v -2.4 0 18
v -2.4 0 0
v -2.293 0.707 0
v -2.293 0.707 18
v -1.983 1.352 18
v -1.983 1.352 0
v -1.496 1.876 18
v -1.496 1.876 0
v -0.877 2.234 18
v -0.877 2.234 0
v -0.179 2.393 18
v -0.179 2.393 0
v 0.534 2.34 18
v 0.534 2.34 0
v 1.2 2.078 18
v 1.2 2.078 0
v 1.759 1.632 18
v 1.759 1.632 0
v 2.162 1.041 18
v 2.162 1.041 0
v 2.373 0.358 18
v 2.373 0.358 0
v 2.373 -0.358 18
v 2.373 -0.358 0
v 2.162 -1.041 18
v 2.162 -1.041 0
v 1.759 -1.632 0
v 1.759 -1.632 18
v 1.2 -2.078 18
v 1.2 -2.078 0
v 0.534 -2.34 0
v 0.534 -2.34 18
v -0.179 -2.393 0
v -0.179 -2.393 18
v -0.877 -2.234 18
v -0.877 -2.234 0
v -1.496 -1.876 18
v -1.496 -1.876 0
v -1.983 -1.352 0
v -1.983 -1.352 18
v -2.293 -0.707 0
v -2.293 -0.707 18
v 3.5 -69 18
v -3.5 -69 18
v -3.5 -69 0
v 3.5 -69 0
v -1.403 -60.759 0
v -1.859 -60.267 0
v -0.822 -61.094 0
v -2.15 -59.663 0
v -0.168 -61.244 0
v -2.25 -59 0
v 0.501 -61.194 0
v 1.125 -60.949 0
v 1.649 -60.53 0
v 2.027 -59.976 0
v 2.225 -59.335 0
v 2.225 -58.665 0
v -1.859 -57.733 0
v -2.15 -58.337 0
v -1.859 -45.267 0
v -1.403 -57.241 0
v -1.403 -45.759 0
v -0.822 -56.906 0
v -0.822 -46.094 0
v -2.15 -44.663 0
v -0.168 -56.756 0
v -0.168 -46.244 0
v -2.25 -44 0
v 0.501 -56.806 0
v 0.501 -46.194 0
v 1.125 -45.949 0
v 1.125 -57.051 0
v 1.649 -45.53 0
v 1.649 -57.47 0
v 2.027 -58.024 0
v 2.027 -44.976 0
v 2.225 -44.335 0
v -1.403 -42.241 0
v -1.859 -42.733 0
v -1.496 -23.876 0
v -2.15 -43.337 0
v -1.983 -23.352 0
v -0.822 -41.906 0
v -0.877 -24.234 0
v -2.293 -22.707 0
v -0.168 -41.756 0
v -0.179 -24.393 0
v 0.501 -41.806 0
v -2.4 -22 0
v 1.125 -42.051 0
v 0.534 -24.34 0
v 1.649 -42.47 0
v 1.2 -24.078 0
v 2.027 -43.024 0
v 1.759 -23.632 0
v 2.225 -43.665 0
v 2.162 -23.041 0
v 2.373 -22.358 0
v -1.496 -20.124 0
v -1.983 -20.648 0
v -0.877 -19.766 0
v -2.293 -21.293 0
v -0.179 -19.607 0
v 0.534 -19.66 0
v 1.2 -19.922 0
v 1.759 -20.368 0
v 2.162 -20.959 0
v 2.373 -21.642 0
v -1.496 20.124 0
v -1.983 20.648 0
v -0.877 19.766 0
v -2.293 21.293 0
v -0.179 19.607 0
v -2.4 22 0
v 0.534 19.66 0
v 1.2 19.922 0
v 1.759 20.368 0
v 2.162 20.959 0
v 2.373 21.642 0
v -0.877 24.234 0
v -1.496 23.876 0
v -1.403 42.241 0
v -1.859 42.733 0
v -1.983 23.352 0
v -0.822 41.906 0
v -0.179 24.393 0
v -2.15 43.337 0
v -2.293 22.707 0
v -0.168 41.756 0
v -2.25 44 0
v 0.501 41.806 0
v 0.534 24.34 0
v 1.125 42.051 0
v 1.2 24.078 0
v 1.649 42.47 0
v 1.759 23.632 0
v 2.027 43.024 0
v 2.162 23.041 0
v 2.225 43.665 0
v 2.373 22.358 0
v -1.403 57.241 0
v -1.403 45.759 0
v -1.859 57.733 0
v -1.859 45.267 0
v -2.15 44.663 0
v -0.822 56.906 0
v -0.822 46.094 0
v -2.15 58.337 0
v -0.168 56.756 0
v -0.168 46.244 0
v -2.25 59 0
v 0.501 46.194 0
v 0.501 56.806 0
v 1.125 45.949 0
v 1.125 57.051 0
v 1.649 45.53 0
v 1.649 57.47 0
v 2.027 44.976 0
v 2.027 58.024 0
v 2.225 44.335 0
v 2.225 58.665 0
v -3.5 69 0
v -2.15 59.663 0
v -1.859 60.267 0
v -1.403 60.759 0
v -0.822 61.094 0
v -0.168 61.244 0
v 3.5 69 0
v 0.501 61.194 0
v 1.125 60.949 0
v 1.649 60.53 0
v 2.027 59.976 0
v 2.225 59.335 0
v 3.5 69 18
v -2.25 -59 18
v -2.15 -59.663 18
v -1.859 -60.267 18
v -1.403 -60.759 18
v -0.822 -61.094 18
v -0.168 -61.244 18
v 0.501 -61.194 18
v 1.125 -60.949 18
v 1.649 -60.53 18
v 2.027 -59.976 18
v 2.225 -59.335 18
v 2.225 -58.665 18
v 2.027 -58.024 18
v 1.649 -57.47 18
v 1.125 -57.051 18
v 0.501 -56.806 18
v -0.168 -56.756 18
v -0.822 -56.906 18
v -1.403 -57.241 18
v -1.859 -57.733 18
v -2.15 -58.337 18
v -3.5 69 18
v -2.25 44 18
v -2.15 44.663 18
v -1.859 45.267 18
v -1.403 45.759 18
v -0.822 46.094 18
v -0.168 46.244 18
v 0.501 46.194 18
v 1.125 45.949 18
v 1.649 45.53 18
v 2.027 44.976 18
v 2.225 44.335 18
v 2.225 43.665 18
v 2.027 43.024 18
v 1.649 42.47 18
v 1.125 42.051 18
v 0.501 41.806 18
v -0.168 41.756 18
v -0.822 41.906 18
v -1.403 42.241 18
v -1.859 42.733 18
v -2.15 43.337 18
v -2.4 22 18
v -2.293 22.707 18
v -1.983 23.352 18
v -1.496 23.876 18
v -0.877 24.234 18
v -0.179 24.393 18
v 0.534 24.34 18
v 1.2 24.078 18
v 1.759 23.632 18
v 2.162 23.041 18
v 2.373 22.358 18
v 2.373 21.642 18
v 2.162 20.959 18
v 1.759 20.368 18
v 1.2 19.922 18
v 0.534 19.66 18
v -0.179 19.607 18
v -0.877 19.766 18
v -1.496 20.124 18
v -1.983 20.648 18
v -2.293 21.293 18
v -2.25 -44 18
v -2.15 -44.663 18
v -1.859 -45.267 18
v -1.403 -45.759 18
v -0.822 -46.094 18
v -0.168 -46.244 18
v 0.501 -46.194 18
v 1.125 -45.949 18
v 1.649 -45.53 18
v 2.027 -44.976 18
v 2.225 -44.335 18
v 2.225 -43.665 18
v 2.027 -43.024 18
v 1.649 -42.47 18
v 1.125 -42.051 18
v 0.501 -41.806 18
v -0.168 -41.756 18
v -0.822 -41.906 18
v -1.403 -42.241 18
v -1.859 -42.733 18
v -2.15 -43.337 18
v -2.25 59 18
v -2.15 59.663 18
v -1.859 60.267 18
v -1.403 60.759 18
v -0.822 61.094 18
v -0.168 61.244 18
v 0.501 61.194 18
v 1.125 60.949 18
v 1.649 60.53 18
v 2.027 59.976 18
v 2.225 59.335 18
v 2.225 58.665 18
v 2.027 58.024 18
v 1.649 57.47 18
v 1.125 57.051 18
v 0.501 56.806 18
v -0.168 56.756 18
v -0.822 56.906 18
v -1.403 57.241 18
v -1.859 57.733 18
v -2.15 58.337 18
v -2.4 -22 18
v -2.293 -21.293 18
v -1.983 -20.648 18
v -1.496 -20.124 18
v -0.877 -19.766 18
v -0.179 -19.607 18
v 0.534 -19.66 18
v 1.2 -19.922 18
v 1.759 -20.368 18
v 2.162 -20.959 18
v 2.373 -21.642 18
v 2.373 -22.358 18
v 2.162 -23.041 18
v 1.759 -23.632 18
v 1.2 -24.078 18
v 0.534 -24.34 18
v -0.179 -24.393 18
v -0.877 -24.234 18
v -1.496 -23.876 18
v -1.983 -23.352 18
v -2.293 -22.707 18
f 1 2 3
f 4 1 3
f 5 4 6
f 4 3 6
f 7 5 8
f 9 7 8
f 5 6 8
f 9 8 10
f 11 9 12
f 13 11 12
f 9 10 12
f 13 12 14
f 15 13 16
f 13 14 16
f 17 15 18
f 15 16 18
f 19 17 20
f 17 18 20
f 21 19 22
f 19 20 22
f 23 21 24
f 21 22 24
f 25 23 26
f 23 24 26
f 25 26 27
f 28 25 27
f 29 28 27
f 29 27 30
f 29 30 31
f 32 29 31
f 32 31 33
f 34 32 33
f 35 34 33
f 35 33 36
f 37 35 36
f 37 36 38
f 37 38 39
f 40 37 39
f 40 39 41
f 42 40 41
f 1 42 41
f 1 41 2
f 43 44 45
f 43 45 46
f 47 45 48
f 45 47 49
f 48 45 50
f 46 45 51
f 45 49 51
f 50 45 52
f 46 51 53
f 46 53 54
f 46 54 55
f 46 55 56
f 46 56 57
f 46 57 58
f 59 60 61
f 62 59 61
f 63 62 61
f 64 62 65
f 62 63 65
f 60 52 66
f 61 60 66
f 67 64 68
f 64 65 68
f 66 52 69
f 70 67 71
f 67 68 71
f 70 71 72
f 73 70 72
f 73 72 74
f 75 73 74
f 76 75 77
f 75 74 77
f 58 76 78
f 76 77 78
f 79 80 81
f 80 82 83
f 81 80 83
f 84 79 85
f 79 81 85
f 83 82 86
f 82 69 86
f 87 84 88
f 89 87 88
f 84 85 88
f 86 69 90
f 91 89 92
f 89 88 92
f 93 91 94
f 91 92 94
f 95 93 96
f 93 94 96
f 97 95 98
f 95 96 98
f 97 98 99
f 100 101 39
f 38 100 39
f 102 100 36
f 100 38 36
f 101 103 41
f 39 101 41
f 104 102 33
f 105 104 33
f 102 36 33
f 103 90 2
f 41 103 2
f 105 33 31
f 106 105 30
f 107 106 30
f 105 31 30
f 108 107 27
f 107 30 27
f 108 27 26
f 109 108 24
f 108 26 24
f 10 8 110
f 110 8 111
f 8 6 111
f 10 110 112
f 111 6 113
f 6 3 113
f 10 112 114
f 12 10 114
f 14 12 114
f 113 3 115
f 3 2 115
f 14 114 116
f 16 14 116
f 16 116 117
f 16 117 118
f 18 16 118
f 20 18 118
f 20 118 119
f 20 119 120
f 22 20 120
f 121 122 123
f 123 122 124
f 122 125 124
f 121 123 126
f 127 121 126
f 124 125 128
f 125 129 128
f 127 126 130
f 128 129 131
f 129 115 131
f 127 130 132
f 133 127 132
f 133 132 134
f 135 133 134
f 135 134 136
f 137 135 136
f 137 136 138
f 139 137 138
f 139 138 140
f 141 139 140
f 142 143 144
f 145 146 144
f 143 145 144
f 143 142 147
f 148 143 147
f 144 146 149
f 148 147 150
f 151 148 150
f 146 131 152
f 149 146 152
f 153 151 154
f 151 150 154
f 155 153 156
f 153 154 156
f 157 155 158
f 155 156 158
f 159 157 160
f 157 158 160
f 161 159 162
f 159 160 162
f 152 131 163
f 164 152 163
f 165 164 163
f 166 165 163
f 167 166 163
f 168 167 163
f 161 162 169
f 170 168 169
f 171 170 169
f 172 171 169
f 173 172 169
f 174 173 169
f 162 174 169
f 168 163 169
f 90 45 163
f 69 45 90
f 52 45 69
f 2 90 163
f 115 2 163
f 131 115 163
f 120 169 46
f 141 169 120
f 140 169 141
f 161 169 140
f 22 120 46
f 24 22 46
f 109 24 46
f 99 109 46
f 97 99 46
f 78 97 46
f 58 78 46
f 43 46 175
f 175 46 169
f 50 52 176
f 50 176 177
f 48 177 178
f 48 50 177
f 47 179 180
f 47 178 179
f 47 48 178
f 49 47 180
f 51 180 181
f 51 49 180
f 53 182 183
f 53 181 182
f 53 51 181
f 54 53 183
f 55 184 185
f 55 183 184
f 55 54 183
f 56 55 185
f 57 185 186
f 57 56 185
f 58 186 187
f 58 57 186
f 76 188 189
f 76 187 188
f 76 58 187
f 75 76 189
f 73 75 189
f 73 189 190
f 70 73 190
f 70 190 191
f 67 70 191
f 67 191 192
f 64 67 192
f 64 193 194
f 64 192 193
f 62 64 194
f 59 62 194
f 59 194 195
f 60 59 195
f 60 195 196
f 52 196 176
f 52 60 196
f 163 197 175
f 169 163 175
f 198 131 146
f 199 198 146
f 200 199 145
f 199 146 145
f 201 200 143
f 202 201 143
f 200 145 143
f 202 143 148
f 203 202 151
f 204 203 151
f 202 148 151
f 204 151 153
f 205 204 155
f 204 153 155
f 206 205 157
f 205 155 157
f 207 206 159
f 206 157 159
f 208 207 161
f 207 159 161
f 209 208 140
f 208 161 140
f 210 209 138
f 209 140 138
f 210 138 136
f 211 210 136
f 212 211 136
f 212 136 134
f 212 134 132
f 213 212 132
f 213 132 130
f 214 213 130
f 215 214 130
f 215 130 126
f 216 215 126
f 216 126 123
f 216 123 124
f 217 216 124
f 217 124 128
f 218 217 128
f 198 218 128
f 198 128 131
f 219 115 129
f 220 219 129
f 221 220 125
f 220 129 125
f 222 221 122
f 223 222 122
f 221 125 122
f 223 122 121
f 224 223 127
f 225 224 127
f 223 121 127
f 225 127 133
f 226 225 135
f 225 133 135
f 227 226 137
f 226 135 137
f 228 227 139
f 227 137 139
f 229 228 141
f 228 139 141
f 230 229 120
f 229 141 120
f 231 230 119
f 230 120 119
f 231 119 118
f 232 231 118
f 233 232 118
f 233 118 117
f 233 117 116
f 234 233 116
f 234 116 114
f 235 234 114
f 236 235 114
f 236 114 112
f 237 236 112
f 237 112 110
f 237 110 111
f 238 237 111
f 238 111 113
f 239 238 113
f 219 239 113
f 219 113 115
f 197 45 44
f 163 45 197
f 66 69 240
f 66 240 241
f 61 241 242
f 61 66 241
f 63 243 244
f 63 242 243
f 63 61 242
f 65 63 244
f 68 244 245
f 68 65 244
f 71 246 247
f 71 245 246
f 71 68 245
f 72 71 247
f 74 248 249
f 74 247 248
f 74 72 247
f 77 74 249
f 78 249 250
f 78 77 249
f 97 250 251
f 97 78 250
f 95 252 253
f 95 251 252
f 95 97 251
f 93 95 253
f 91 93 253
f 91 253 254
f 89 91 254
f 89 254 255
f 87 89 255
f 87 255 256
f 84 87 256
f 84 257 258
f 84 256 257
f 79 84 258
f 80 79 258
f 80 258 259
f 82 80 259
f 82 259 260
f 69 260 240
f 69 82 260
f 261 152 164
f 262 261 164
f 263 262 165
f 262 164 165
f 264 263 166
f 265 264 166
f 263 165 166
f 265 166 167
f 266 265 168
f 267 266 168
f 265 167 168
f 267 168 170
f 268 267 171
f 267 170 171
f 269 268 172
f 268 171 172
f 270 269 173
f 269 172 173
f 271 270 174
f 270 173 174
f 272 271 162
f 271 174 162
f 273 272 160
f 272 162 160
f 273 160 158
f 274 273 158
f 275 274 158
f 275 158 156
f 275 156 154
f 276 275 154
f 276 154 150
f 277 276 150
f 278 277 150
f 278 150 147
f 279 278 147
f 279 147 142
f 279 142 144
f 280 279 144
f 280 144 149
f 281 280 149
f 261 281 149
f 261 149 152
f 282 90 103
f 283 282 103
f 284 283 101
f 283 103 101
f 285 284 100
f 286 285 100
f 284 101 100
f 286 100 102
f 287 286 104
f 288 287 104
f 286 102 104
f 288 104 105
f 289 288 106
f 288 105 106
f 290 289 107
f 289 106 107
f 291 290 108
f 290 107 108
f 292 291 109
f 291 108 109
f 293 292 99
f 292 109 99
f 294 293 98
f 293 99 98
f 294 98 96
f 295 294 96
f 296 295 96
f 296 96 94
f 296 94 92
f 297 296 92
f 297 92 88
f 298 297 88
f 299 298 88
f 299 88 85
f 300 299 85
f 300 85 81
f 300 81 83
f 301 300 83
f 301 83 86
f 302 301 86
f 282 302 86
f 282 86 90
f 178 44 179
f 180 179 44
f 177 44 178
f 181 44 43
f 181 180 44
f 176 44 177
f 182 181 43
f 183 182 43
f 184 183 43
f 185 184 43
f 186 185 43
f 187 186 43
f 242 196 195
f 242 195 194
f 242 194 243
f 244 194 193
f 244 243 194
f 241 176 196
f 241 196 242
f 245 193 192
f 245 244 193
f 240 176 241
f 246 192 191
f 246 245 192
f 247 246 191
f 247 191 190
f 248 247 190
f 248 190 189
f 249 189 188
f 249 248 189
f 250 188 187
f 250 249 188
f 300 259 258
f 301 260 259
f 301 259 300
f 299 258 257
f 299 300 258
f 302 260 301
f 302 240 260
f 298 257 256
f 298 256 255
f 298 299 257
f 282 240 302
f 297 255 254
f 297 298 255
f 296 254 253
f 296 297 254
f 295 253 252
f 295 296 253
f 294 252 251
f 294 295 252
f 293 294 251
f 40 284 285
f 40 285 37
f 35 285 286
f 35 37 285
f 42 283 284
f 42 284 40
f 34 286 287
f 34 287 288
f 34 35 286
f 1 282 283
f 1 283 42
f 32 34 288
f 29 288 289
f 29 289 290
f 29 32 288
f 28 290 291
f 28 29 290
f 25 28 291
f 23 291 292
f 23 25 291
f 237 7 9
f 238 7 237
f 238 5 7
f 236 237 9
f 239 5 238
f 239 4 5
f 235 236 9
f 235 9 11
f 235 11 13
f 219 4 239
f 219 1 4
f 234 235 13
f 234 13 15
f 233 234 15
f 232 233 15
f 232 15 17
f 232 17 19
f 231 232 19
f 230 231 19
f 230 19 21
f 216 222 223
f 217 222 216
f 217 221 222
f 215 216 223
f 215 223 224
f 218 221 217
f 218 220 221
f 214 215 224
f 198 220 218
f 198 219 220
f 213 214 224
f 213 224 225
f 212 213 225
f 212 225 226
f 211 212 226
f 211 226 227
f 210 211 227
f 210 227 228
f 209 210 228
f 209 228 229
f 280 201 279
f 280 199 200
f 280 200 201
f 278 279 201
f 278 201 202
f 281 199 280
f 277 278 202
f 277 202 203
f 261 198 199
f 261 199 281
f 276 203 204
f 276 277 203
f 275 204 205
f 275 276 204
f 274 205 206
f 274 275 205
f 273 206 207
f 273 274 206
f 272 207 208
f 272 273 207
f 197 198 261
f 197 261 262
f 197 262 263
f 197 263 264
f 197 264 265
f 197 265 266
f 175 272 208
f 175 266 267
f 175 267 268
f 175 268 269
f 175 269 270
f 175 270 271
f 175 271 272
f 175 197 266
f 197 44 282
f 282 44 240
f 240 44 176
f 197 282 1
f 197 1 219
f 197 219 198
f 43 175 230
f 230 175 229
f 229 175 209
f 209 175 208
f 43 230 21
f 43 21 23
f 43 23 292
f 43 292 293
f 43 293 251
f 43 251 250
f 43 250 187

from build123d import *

# Parameters (mm, degrees)
SKETCH_1_W         = 7
SKETCH_1_H         = 138
EXTRUDE_1_DEPTH    = 18
HOLE_WIZARD_M4_1_D = 4.8
HOLE_WIZARD_M4_2_D = 4.5


with BuildPart() as part:
    # ｽｹｯﾁ1 → ﾎﾞｽ - 押し出し1 (new body)
    with BuildSketch(Plane.XY):
        Rectangle(SKETCH_1_W, SKETCH_1_H)
    extrude(amount=EXTRUDE_1_DEPTH)

    # M4 すきま穴1 (through all)
    with Locations(Plane.XY.offset(18)):
        with Locations((0, 0), (0, 22), (0, -22)):
            Hole(HOLE_WIZARD_M4_1_D / 2)

    # M4 すきま穴2 (through all)
    with Locations(Plane(origin=(0, 44, 18), x_dir=(1, 0, 0), z_dir=(0, 0, 1))):
        with Locations((0, 0), (0, 15)):
            hole_wizard_m4_2 = Hole(HOLE_WIZARD_M4_2_D / 2)

    # ﾐﾗｰ1: M4 すきま穴2 across plane
    add(hole_wizard_m4_2.mirror(Plane.ZX), mode=Mode.SUBTRACT)


solid = part.part
